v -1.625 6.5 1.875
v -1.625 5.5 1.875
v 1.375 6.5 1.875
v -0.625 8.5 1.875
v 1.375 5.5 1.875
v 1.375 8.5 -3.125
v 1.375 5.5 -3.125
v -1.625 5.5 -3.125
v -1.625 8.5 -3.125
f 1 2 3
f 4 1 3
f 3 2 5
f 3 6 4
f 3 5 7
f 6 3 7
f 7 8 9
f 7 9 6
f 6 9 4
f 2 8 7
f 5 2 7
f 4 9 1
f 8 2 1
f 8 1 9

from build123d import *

# Parameters (mm, degrees)
SKETCH_1_W          = 15
SKETCH_1_H          = 25
EXTRUDE_1_DEPTH     = 15
SKETCH_4_W          = 33.460320445
SKETCH_4_H          = 26.687965621
CUT_EXTRUDE_1_DEPTH = 15
SKETCH_5_W          = 41.021028331
SKETCH_5_H          = 23.23593172
CUT_EXTRUDE_2_DEPTH = 15
SCALE_1_SCALE       = 0.2


with BuildPart() as part:
    # 草圖1 → 填料-伸長1 (new body)
    with BuildSketch(Plane(origin=(0, 0, 0), x_dir=(1, 0, 0), z_dir=(0, 1, 0))):
        Rectangle(SKETCH_1_W, SKETCH_1_H)
    extrude(amount=EXTRUDE_1_DEPTH)

    # 草圖4 → 除料-伸長1 (cut)
    with BuildSketch(Plane(origin=(-9.689922481, 4.84496124, 1.937984496), x_dir=(0.157499846, -0.078749923, 0.984374039), z_dir=(-0.880450906, 0.440225453, 0.176090181))):
        with Locations((1.566467167, 5.33065366)):
            Rectangle(SKETCH_4_W, SKETCH_4_H)
    extrude(amount=CUT_EXTRUDE_1_DEPTH, mode=Mode.SUBTRACT)

    # 草圖5 → 除料-伸長2 (cut)
    with BuildSketch(Plane(origin=(8.101851852, 8.101851852, 3.240740741), x_dir=(-0.19245009, -0.19245009, 0.962250449), z_dir=(-0.680413817, -0.680413817, -0.272165527))):
        with Locations((-1.846019689, 5.465840721)):
            Rectangle(SKETCH_5_W, SKETCH_5_H)
    extrude(amount=-CUT_EXTRUDE_2_DEPTH, mode=Mode.SUBTRACT)


with BuildPart() as part_1:
    # 縮放比例1: scaled about (-0.15625, 6.875, -0.78125)
    add(part.part.scale(SCALE_1_SCALE).moved(Location((-0.125, 5.5, -0.625))))


solid = part_1.part
